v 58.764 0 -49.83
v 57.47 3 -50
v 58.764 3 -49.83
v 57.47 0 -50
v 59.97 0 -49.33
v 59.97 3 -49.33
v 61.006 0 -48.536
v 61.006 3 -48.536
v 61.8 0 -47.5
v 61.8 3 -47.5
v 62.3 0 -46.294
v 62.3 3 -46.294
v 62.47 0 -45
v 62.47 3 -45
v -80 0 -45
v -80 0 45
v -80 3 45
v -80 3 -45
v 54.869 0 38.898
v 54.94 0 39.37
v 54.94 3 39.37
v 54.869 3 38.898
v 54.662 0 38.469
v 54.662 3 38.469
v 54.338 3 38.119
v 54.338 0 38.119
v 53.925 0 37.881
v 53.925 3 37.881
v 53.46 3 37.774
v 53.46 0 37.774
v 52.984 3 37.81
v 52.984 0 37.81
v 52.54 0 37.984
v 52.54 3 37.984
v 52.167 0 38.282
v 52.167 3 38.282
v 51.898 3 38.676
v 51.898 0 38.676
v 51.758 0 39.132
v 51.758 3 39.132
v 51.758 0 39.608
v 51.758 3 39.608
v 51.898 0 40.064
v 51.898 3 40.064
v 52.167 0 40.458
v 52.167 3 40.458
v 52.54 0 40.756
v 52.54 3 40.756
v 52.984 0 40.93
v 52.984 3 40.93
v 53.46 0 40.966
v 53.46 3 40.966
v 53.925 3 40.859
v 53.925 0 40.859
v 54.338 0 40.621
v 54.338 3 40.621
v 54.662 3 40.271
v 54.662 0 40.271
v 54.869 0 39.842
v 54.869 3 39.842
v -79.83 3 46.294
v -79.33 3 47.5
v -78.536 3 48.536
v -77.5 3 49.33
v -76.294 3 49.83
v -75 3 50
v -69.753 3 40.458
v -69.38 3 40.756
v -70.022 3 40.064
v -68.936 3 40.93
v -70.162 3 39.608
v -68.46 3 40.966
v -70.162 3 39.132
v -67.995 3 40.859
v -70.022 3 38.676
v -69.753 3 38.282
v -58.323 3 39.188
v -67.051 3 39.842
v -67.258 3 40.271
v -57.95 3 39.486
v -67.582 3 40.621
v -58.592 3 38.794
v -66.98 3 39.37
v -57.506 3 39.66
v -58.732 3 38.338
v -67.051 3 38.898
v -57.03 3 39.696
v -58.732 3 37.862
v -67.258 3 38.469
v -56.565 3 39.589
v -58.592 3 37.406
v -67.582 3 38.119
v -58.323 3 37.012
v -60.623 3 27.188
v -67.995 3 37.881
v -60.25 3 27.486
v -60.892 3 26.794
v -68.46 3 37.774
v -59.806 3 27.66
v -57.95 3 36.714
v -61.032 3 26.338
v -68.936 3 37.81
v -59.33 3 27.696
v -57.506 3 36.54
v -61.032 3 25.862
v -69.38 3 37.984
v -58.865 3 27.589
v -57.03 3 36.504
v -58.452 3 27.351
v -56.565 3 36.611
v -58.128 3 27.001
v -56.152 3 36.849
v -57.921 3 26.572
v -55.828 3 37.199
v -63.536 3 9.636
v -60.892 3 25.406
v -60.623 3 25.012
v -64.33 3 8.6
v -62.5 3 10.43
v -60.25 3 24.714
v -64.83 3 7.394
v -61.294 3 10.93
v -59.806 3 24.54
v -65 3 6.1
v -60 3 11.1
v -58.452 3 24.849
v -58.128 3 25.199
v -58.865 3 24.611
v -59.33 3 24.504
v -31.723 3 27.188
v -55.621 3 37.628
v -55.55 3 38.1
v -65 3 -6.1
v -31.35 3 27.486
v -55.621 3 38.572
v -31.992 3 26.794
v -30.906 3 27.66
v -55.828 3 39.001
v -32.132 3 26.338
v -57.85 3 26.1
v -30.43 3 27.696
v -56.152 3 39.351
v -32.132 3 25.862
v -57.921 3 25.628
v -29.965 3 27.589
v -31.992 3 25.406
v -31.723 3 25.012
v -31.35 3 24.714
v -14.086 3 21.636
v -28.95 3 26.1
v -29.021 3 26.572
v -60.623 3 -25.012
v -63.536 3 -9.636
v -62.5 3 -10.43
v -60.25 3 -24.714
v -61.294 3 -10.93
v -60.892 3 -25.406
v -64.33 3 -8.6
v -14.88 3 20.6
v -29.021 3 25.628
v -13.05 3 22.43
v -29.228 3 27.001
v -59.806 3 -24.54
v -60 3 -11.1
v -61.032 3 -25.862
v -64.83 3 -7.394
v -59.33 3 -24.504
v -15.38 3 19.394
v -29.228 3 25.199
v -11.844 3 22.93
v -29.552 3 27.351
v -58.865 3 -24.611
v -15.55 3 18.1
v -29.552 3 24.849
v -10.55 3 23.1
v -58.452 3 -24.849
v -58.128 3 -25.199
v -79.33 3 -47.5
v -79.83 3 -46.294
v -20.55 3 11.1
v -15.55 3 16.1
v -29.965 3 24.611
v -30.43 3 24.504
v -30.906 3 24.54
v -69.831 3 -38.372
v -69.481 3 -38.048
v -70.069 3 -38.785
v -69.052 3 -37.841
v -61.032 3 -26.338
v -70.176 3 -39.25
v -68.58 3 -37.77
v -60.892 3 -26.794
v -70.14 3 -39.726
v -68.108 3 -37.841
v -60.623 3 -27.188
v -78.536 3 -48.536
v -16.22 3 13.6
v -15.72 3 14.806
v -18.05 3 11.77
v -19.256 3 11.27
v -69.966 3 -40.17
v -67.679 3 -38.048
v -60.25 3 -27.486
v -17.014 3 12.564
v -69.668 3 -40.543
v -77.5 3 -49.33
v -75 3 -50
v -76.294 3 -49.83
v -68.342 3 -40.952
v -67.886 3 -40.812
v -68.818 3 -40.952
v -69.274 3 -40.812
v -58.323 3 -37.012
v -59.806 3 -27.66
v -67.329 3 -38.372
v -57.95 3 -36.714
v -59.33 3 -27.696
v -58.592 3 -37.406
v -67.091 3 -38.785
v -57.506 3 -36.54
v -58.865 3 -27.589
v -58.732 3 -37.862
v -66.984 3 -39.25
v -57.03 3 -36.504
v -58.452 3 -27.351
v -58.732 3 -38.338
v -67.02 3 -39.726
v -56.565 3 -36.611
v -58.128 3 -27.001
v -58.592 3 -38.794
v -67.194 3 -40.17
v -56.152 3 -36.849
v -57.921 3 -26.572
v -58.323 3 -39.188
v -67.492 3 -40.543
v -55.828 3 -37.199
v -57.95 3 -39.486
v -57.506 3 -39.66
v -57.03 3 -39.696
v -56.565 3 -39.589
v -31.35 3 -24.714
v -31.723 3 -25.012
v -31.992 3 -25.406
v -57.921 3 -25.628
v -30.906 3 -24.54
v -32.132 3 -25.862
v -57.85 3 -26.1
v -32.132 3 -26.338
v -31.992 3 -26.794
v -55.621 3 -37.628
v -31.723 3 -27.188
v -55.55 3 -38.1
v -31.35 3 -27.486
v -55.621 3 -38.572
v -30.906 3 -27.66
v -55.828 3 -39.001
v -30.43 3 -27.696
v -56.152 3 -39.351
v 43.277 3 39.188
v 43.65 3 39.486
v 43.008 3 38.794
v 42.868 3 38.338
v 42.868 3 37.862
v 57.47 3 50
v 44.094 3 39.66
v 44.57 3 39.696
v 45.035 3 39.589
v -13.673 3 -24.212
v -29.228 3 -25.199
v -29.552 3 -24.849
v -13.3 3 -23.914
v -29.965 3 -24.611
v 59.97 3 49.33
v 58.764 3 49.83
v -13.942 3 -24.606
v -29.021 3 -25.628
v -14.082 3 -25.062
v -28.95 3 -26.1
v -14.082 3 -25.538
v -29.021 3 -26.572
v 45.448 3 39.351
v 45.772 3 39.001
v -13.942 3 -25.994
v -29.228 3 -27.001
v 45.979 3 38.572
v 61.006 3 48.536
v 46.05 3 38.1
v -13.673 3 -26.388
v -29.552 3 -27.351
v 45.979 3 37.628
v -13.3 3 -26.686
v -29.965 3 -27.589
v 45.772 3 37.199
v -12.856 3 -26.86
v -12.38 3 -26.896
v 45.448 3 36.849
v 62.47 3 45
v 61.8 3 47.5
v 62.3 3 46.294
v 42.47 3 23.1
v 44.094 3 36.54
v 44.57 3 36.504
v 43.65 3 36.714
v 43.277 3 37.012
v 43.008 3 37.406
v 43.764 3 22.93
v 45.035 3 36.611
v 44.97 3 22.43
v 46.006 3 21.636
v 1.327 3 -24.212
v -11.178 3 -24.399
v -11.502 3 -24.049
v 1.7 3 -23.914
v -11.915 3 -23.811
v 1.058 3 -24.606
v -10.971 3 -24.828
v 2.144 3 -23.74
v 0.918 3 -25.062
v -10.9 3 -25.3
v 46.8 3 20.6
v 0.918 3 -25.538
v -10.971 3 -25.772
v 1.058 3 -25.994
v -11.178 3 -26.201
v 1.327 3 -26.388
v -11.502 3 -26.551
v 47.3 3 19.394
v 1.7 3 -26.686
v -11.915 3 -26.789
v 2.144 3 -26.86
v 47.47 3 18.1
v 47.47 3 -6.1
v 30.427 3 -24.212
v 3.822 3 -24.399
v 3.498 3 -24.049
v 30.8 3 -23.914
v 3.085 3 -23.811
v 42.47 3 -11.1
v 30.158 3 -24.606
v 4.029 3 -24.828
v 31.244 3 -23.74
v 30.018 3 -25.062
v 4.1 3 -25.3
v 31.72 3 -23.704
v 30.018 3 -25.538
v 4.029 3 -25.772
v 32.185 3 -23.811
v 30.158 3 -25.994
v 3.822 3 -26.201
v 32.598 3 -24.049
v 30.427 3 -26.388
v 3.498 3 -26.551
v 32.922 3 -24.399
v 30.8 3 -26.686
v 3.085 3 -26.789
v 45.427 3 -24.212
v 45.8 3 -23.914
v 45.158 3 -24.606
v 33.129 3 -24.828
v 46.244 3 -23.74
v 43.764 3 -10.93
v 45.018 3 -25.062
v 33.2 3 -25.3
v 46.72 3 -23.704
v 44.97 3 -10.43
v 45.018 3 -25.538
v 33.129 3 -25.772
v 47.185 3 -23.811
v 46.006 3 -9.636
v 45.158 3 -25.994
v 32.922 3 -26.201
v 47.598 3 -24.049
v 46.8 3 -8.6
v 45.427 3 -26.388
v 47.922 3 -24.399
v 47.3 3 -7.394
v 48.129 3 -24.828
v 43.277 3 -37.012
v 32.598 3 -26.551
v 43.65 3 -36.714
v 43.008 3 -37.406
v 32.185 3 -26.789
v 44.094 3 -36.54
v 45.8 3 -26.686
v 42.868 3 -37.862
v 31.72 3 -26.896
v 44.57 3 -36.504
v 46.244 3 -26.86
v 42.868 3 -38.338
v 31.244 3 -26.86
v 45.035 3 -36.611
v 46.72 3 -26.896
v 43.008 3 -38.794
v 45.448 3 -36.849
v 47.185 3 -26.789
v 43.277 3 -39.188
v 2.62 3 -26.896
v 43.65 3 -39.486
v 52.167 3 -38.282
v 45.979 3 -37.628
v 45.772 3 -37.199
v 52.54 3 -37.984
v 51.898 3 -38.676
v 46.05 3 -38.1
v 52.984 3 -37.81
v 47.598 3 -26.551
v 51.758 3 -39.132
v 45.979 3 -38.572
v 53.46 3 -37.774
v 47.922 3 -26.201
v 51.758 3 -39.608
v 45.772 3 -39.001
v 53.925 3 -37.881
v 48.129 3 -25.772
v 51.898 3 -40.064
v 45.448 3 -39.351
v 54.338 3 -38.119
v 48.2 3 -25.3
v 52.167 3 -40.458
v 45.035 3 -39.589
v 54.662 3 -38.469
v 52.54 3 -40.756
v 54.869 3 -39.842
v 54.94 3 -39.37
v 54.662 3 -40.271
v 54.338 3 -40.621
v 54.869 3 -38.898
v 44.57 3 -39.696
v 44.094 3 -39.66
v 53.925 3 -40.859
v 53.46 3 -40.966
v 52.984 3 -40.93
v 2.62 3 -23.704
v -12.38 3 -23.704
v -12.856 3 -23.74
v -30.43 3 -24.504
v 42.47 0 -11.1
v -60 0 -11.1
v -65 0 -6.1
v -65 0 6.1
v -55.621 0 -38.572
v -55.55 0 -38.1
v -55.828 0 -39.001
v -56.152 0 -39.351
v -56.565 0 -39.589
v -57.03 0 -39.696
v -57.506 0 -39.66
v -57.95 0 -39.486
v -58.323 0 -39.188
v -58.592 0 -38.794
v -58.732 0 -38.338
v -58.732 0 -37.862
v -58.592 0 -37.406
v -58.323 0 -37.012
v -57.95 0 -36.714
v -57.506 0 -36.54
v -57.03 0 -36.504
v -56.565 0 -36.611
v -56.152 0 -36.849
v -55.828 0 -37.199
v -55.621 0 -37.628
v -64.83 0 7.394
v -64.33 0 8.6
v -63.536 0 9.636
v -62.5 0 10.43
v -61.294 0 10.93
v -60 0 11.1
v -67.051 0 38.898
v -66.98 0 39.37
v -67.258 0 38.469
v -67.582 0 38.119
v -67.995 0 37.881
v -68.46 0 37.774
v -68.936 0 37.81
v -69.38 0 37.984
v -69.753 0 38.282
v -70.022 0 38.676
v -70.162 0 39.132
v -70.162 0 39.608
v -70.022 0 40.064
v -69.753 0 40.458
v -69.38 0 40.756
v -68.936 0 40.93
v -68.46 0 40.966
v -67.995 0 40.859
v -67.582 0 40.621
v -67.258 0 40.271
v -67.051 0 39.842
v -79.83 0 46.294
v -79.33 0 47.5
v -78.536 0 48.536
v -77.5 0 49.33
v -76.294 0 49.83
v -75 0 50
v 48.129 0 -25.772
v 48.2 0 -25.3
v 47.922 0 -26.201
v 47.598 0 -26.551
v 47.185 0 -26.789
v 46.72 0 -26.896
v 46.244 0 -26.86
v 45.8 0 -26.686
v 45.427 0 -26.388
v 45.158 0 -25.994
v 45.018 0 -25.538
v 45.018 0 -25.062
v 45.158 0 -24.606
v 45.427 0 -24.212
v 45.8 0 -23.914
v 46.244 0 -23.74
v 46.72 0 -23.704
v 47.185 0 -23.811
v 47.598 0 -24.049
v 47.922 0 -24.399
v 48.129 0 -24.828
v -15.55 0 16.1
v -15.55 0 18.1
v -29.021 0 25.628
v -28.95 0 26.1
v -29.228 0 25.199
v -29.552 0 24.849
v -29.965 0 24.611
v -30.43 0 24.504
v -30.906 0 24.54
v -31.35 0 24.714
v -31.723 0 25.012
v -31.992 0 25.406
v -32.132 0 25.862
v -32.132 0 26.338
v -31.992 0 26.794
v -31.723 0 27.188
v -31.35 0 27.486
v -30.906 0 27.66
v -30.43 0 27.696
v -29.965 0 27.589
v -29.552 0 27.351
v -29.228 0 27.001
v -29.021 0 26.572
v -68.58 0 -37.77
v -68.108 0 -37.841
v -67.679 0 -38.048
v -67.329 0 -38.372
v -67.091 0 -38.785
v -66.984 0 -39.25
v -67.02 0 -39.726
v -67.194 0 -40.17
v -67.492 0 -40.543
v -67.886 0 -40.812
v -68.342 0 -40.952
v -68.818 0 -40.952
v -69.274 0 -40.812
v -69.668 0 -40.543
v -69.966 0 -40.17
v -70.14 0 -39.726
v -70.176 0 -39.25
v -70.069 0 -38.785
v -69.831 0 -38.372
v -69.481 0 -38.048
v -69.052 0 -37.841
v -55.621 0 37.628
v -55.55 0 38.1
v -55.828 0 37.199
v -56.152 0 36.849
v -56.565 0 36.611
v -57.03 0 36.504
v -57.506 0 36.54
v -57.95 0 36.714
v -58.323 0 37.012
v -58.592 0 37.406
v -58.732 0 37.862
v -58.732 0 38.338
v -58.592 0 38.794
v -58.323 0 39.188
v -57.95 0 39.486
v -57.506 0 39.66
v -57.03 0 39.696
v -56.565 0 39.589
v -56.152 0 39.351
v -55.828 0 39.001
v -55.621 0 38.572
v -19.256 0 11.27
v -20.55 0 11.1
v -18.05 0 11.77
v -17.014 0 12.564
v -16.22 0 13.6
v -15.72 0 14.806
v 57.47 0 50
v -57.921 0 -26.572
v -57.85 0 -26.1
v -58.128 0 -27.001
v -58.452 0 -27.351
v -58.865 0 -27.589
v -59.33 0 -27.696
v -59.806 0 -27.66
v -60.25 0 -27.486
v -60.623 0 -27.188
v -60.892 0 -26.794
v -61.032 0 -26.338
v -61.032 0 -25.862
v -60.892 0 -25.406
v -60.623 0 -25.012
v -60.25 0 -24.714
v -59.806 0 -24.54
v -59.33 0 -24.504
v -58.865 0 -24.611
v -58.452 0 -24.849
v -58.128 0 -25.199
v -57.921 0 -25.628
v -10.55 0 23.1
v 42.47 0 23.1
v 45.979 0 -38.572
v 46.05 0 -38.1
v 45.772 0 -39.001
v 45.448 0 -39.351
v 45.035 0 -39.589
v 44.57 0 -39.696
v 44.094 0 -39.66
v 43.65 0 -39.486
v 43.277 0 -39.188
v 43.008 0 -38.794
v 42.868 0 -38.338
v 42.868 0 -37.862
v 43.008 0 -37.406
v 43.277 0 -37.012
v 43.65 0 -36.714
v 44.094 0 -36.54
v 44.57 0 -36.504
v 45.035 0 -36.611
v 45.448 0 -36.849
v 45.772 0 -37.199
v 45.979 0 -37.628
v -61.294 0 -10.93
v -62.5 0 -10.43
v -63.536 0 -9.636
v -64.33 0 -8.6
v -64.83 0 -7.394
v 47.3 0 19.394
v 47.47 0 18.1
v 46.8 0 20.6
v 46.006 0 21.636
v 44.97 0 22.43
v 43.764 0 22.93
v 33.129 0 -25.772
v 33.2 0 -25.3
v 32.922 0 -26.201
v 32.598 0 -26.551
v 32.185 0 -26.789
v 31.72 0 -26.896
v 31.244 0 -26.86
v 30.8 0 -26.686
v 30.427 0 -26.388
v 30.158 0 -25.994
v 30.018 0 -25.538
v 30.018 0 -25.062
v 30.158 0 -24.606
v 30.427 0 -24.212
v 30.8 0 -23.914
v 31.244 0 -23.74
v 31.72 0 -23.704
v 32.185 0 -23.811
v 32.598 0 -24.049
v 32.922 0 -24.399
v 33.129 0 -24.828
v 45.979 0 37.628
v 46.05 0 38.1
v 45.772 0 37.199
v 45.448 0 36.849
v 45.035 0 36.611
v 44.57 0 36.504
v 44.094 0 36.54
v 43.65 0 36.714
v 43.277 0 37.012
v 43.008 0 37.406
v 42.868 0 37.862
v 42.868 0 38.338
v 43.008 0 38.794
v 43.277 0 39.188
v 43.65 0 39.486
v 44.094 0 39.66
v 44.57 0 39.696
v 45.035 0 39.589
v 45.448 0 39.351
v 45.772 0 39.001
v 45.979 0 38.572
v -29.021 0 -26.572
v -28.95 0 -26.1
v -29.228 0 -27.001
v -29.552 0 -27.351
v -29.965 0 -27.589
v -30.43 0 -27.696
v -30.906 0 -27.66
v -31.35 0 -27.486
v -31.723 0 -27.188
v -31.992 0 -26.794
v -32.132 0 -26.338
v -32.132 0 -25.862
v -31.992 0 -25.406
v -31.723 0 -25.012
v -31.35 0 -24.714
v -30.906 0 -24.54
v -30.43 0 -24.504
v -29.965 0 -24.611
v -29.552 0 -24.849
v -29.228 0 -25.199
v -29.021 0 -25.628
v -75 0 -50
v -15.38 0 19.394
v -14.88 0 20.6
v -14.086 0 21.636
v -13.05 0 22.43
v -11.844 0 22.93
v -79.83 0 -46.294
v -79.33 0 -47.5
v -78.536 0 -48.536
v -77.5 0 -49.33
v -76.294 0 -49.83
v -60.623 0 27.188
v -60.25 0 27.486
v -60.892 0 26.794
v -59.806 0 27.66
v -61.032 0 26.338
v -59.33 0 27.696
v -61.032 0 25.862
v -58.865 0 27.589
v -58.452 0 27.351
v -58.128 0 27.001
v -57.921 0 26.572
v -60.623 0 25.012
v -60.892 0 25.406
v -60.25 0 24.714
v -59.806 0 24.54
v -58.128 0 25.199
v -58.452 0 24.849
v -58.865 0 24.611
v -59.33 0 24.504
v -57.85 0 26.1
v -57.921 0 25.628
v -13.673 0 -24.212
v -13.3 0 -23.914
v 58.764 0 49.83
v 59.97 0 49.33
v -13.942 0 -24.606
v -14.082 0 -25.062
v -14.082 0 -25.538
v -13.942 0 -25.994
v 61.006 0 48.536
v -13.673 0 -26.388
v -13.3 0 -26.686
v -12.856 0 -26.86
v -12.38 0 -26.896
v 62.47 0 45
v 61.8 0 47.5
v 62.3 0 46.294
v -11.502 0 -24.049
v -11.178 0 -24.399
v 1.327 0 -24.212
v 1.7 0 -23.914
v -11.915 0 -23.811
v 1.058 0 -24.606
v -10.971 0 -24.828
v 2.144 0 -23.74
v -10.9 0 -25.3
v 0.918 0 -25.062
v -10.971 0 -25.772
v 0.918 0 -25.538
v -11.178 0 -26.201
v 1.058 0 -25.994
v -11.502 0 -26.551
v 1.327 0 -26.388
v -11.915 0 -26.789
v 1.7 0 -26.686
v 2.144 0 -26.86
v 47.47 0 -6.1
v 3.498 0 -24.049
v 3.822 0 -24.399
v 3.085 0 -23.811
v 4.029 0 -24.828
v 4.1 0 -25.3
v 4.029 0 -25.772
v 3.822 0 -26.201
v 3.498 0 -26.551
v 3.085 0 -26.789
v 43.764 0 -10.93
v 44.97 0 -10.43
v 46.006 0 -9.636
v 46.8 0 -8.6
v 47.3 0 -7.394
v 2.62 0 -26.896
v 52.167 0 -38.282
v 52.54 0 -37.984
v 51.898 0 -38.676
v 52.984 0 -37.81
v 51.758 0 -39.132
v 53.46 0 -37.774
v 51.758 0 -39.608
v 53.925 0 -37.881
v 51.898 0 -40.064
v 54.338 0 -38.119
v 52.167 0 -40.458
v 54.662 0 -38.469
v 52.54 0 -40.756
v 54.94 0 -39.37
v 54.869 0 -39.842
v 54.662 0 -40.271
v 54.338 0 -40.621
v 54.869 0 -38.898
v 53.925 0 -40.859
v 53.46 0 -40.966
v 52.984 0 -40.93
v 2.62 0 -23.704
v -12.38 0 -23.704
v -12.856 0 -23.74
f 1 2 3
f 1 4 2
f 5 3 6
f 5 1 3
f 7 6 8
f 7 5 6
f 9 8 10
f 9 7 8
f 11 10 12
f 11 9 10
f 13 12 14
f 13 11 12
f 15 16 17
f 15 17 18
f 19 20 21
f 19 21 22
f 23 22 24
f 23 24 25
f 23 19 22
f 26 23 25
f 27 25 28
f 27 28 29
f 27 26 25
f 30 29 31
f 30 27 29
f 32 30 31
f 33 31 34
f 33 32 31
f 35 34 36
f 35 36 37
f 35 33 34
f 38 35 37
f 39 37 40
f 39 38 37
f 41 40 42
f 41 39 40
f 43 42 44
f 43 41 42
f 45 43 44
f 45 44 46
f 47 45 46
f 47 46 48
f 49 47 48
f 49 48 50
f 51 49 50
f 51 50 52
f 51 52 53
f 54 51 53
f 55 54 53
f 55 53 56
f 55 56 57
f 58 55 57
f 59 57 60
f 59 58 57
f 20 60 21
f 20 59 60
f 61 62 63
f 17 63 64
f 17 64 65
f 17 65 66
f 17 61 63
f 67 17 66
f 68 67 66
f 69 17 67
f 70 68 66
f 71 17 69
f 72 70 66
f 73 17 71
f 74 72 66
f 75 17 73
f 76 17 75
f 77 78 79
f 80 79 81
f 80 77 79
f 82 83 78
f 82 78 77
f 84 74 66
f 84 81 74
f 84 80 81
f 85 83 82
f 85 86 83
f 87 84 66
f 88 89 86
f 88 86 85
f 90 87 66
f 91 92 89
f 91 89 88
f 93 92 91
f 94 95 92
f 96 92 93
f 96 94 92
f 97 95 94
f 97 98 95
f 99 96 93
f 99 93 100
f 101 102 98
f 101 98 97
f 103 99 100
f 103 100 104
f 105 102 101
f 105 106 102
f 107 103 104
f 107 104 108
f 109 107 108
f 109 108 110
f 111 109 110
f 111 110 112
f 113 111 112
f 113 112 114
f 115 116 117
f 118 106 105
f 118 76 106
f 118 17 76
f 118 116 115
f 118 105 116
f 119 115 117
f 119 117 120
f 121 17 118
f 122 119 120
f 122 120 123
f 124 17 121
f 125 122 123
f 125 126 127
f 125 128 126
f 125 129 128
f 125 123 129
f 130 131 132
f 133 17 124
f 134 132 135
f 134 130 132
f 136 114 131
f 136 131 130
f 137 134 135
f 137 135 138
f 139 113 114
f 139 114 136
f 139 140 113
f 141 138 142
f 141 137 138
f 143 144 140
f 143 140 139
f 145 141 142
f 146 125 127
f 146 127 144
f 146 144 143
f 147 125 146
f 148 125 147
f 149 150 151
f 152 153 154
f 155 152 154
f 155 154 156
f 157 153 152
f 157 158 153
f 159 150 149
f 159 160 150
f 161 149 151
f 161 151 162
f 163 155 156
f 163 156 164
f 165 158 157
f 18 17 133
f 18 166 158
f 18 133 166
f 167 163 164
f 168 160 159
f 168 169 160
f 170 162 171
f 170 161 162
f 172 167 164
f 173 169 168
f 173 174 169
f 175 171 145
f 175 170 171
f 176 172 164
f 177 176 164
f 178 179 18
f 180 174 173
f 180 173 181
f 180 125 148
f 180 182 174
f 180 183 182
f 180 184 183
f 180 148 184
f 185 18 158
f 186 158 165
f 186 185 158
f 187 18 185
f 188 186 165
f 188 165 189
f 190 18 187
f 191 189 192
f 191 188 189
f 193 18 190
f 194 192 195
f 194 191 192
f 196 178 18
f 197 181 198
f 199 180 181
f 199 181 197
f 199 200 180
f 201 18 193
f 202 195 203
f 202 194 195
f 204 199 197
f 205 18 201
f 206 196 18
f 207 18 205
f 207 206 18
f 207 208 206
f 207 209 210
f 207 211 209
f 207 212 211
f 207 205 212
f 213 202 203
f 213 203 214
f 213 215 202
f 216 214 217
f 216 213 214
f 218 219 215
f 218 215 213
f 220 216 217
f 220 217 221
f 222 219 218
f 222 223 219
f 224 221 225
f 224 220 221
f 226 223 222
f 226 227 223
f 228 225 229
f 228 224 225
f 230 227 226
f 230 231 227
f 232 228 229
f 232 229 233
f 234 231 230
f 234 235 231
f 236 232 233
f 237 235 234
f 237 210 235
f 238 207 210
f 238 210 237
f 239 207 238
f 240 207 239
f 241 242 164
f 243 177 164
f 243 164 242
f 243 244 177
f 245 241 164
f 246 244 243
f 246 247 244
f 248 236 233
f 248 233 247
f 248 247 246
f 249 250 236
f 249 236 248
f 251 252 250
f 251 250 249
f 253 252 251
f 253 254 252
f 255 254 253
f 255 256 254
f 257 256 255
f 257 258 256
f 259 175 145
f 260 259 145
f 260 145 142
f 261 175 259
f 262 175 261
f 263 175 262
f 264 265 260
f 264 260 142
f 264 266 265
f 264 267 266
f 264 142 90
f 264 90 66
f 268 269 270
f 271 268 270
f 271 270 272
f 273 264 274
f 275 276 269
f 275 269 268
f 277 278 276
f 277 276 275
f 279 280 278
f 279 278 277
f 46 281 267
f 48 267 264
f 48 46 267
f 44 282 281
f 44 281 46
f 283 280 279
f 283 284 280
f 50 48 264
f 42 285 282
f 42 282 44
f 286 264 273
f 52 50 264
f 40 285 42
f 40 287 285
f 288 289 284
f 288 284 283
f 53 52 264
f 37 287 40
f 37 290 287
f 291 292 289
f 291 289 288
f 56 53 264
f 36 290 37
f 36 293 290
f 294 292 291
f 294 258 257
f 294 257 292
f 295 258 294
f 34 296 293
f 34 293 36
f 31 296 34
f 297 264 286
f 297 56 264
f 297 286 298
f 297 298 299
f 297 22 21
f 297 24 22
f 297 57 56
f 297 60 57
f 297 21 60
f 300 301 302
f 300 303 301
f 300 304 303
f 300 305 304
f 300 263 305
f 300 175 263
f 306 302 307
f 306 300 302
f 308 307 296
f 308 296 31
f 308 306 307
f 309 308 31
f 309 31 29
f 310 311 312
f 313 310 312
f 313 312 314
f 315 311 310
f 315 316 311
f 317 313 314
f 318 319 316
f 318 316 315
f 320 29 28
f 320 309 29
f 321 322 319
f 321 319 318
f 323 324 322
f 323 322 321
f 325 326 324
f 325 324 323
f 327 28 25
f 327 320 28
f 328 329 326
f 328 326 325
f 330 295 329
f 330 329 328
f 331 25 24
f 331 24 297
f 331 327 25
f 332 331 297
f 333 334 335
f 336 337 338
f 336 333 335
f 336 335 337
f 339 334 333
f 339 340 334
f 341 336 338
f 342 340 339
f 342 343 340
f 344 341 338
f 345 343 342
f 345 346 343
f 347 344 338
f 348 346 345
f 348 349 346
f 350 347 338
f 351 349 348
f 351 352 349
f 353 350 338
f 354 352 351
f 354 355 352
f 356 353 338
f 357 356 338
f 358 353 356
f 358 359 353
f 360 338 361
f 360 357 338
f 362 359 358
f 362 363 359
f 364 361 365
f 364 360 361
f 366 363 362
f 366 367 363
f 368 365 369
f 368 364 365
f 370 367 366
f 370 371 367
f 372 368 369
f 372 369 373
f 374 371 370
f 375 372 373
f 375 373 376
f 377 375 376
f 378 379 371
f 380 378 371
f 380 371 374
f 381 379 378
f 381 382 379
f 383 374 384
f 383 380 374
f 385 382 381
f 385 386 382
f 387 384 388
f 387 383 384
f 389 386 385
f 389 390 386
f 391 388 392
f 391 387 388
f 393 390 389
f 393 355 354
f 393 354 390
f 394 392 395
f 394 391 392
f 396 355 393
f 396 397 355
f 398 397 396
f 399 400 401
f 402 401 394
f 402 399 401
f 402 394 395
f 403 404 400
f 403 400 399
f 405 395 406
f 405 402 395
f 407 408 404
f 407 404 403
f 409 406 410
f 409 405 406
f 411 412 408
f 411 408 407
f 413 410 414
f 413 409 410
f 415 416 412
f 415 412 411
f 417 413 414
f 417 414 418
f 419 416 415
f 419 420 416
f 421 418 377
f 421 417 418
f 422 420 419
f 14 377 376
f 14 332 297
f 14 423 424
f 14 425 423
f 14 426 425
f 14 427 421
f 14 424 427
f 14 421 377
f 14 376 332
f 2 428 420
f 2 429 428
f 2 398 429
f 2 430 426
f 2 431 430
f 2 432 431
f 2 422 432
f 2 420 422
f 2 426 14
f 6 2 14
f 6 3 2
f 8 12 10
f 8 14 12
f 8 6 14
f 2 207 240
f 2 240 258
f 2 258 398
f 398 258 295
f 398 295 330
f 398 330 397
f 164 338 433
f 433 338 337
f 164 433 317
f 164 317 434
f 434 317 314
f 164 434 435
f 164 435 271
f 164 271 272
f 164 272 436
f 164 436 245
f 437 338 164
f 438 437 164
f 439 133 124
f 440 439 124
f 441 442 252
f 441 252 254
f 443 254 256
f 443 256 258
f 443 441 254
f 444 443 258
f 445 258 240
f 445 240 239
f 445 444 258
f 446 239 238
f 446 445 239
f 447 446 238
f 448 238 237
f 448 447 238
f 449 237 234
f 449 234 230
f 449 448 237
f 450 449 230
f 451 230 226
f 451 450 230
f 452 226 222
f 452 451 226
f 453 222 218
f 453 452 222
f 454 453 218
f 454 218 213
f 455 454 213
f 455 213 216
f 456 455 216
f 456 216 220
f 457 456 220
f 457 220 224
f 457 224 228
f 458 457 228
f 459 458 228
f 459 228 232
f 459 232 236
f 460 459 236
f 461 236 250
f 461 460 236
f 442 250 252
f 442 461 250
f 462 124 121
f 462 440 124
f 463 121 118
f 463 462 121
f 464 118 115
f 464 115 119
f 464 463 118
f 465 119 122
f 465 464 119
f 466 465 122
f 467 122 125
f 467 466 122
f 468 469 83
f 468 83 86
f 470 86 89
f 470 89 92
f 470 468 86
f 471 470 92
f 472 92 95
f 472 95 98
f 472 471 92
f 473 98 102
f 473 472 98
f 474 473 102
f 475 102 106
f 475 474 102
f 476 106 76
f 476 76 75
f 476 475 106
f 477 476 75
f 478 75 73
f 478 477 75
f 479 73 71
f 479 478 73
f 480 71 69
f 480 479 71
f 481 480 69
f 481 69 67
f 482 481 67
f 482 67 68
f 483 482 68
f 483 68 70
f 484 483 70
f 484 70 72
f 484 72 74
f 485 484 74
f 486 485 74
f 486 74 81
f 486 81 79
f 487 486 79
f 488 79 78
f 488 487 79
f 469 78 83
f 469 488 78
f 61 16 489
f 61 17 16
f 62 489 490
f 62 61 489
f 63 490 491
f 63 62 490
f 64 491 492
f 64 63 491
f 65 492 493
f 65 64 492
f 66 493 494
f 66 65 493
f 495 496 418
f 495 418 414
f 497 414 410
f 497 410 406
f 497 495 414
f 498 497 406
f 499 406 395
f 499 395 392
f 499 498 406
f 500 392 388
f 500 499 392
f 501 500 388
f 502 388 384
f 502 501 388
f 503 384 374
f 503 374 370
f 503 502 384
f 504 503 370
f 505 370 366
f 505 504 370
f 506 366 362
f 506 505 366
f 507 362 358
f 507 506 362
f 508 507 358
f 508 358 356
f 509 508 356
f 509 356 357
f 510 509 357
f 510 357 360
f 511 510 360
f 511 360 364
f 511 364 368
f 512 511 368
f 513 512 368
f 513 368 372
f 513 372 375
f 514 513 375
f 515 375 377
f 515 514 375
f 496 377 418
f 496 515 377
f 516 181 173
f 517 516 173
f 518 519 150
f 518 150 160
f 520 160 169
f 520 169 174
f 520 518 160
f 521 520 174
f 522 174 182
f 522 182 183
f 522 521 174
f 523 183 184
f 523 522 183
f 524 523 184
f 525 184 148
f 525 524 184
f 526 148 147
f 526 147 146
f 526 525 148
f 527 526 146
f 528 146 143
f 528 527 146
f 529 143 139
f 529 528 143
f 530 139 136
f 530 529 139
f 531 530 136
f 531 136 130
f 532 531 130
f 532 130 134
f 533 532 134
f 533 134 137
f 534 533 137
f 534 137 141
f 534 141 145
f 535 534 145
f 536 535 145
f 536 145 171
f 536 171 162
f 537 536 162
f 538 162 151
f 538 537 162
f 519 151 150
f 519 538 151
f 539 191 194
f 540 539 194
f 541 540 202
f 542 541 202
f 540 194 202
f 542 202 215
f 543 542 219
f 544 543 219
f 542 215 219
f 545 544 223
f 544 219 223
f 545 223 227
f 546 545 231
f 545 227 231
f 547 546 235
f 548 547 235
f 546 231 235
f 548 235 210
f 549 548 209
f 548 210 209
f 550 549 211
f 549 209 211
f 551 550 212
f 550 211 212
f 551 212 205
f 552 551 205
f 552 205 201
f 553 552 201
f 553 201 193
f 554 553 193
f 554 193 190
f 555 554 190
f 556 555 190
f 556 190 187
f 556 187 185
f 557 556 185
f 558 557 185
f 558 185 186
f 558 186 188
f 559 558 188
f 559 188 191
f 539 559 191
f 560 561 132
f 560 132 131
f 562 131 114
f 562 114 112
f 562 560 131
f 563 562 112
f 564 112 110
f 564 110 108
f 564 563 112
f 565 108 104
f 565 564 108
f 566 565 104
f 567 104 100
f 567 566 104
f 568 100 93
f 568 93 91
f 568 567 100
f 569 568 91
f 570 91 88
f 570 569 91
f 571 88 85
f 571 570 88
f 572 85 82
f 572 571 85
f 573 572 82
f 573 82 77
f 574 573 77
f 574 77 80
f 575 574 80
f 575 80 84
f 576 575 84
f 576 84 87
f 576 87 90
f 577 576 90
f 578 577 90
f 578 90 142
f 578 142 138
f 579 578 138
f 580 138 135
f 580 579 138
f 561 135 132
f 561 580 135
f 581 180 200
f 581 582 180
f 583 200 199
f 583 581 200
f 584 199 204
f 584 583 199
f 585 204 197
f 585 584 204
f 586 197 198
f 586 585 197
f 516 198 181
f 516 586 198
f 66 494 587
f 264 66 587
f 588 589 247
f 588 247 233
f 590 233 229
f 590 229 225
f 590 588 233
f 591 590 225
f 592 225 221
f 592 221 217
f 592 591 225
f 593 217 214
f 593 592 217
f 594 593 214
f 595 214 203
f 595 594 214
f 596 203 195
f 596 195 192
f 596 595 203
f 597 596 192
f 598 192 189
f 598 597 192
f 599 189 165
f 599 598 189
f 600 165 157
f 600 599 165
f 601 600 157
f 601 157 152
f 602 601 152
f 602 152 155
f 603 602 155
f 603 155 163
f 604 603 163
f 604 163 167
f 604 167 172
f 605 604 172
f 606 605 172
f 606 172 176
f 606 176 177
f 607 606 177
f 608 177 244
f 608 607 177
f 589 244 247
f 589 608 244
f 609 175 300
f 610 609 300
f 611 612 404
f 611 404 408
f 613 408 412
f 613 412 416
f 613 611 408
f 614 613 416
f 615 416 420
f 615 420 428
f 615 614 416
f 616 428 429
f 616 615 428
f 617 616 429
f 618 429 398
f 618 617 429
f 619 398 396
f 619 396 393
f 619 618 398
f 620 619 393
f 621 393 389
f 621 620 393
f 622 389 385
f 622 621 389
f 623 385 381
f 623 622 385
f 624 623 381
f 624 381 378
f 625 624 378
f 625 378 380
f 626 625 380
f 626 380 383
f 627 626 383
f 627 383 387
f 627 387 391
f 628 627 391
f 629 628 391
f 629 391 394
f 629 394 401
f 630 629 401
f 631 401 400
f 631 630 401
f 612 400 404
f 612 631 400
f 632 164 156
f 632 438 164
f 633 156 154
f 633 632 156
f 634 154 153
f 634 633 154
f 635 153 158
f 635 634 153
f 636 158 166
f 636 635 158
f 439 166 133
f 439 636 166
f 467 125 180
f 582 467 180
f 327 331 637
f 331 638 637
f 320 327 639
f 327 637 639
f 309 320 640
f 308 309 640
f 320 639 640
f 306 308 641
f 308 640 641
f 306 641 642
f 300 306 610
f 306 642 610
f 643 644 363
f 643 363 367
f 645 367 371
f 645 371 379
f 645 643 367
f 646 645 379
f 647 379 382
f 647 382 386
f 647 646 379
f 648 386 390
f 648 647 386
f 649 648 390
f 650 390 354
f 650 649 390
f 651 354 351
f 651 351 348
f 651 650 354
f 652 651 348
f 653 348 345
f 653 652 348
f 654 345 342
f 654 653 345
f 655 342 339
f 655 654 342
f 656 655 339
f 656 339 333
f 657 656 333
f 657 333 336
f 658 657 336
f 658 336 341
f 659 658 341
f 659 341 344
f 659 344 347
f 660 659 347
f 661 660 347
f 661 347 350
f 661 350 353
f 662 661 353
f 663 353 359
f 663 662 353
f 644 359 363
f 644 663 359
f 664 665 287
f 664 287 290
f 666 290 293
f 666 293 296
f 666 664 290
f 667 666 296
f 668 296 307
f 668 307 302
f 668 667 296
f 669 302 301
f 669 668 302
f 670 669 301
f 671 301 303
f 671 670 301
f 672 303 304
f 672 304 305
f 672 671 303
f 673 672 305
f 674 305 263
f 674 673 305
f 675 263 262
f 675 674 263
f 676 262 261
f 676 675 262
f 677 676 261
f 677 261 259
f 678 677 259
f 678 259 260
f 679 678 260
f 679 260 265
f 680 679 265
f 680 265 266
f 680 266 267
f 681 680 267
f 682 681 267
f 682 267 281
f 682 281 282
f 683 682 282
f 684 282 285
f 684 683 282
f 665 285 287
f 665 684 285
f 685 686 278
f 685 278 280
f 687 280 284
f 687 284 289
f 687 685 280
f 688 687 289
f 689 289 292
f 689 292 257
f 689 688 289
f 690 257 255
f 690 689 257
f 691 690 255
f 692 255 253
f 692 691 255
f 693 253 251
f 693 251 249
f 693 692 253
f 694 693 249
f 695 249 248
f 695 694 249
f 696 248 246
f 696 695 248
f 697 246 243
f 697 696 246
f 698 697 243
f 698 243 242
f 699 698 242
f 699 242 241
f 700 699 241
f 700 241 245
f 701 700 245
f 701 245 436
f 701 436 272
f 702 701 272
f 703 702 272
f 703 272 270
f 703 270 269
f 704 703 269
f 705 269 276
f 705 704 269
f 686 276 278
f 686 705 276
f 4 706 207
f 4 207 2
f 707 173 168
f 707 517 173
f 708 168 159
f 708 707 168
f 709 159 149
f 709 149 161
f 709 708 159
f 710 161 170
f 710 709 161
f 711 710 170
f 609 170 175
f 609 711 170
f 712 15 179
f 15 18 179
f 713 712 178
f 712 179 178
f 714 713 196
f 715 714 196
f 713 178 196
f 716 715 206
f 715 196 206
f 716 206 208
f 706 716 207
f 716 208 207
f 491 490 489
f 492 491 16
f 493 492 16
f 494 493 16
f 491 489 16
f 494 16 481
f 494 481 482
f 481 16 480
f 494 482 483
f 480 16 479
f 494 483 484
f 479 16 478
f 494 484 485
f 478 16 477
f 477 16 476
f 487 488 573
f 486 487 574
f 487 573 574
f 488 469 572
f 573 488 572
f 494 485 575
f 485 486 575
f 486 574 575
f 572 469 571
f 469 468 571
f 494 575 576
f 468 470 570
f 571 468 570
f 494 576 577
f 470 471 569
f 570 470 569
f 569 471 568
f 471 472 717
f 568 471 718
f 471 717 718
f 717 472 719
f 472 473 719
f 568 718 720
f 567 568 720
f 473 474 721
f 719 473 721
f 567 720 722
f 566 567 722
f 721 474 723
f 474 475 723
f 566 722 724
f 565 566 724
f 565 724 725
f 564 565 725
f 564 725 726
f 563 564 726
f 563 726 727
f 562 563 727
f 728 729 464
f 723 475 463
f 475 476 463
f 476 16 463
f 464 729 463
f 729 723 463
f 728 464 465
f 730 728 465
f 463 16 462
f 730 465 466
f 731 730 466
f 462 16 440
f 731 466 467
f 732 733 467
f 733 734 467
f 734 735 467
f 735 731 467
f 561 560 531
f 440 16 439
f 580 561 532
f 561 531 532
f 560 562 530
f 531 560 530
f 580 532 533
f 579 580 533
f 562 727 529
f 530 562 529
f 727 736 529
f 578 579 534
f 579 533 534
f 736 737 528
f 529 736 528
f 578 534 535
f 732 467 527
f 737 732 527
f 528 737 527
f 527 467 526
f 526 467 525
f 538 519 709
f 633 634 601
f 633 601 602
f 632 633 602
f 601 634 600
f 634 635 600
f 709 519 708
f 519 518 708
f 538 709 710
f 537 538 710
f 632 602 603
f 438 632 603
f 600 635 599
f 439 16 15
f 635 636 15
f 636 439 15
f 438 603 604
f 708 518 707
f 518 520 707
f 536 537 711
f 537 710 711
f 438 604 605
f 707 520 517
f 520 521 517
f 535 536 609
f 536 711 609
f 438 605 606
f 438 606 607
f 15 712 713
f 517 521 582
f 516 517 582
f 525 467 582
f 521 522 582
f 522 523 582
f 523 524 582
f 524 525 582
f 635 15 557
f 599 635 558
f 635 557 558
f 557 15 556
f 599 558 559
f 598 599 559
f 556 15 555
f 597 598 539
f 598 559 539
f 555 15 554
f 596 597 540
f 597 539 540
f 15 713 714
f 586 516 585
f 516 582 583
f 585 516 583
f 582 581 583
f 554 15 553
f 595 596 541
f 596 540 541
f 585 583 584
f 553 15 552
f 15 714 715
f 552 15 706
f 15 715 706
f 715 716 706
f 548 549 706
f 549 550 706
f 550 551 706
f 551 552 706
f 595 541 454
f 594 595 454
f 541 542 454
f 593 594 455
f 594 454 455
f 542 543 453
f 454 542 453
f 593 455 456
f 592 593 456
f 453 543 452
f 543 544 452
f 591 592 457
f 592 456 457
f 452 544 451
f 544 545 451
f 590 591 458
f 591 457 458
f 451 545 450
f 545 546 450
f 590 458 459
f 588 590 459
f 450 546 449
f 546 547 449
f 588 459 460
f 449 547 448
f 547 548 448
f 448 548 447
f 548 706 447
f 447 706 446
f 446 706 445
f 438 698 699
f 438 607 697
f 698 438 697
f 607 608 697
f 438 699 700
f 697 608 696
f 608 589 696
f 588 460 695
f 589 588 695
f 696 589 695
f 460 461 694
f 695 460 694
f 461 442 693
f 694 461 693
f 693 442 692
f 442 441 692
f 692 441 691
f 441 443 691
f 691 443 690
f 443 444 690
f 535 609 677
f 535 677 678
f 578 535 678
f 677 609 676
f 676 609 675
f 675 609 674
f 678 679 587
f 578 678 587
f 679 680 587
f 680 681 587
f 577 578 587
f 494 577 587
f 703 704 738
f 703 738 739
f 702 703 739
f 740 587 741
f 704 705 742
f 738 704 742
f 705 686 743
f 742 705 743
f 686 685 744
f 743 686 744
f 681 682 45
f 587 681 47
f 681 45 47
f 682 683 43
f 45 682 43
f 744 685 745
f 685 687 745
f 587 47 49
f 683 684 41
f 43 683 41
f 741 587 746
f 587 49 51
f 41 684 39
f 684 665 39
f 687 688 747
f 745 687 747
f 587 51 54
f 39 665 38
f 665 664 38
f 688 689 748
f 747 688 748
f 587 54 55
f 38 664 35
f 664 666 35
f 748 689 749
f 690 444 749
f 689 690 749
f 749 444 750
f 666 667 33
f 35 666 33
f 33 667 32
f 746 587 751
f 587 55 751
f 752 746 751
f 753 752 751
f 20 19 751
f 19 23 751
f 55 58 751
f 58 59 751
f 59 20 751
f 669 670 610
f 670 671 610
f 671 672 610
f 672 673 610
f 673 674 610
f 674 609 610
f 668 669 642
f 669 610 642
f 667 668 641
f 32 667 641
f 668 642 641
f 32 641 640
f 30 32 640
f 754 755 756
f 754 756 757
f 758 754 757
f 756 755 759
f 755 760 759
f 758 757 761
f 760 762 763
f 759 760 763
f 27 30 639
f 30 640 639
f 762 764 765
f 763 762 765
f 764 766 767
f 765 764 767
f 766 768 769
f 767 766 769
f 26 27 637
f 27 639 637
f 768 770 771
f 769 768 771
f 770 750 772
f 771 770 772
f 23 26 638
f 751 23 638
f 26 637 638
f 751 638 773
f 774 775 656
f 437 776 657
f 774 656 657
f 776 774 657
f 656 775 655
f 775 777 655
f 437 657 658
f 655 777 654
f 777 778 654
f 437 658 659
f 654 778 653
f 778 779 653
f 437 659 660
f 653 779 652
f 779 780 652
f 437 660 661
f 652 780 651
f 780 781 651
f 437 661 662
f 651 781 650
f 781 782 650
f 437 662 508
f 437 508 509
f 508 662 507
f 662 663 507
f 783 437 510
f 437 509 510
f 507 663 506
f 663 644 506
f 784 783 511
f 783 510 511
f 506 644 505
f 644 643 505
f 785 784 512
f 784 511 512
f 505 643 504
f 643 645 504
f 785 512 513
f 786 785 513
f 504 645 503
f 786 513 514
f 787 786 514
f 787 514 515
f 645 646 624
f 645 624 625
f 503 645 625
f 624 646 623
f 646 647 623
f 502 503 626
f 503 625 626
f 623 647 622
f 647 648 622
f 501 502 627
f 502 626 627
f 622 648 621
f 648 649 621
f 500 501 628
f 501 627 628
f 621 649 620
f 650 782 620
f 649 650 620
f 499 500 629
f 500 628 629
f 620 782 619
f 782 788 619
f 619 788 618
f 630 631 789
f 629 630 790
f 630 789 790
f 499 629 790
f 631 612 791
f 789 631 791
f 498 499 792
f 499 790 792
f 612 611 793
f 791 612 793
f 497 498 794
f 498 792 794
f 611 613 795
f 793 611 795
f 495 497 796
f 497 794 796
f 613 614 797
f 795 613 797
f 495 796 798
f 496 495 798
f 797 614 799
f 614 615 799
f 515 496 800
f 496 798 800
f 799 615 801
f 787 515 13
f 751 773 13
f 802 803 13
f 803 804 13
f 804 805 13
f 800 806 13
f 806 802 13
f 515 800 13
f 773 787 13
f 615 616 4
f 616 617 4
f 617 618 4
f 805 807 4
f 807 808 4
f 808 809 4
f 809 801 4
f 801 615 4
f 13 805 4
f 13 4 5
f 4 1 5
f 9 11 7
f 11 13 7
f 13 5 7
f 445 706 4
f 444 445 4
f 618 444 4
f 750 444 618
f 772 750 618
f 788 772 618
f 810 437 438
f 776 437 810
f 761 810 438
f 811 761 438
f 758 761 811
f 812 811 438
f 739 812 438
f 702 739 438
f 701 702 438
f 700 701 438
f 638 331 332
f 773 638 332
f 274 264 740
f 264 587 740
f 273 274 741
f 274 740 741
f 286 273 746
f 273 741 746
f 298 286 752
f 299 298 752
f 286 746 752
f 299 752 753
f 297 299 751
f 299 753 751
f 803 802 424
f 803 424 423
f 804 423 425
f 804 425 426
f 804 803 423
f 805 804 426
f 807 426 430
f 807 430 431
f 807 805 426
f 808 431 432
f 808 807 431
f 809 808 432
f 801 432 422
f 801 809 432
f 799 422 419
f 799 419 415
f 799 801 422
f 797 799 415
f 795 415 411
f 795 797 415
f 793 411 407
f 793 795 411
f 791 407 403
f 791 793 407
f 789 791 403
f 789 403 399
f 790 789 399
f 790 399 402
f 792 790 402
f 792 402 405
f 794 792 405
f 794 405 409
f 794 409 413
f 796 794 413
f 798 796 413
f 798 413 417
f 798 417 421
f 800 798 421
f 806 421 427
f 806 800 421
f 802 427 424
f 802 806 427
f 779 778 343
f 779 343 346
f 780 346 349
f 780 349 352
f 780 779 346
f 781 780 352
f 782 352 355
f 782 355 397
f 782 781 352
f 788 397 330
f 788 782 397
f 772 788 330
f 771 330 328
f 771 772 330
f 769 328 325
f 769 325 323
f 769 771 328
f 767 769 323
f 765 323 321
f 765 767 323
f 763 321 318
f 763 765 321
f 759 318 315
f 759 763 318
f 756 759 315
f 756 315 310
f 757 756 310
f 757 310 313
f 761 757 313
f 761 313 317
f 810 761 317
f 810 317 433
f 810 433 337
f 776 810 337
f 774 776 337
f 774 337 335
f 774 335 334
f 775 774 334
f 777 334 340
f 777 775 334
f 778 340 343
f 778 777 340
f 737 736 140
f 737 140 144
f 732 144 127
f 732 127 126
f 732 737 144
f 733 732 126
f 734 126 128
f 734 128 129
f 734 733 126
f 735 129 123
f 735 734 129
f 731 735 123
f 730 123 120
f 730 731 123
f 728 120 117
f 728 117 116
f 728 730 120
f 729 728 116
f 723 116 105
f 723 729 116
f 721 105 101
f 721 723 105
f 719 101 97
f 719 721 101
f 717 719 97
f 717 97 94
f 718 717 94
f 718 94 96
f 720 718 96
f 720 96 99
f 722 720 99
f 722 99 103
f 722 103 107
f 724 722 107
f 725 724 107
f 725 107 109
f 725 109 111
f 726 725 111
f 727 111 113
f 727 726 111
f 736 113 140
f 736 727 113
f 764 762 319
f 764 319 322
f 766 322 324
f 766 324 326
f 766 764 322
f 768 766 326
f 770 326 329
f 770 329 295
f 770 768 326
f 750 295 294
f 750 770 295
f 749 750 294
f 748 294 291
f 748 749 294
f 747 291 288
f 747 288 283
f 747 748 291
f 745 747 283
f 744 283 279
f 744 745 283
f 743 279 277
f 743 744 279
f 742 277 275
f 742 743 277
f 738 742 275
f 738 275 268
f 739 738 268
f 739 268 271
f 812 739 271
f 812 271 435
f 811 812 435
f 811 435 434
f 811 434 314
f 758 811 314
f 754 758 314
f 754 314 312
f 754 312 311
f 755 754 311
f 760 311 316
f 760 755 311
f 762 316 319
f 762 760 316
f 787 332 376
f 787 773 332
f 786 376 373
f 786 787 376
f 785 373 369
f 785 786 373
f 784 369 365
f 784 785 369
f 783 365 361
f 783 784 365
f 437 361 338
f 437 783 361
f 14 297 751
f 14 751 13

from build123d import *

# Parameters (mm, degrees)
SKETCH1_W                 = 160
SKETCH1_H                 = 100
BOSS_EXTRUDE1_DEPTH       = 3
SKETCH5_R                 = 1.6
CUT_EXTRUDE1_DEPTH        = 95.387499172
SKETCH_PATTERN1_OUTLINE_R = 1.6
SKETCH_PATTERN1_DEPTH     = 3
ZONA_GPIOS_W              = 17.53
ZONA_GPIOS_H              = 100
ZONAGPIOS_DEPTH           = 95.387499172
CUT_EXTRUDE4_DEPTH        = 95.387499172
FILLET1_R                 = 5


# Read off the part's stored shape, not the designer's step: Sketch-Pattern1
with BuildPart() as part:
    # Sketch1 → Boss-Extrude1 (new body)
    with BuildSketch(Plane(origin=(0, 0, 0), x_dir=(1, 0, 0), z_dir=(0, 1, 0))):
        Rectangle(SKETCH1_W, SKETCH1_H)
    extrude(amount=BOSS_EXTRUDE1_DEPTH)

    # Sketch5 → Cut-Extrude1 (cut, through all)
    with BuildSketch(Plane(origin=(0, 3, 0), x_dir=(1, 0, 0), z_dir=(0, 1, 0))):
        with Locations(Location((-68.58, 39.37, 0), (0, 0, 270))):
            Circle(SKETCH5_R)
    extrude(amount=-CUT_EXTRUDE1_DEPTH, mode=Mode.SUBTRACT)

    # Sketch-Pattern1 outline → Sketch-Pattern1 (cut)
    with BuildSketch(Plane(origin=(0, 0, 0), x_dir=(1, 0, 0), z_dir=(0, 1, 0))):
        with Locations((46.6, 25.3)):
            Circle(SKETCH_PATTERN1_OUTLINE_R)
        with Locations((-57.15, 38.1)):
            Circle(SKETCH_PATTERN1_OUTLINE_R)
        with Locations((-57.15, -38.1)):
            Circle(SKETCH_PATTERN1_OUTLINE_R)
        with Locations((44.45, -38.1)):
            Circle(SKETCH_PATTERN1_OUTLINE_R)
        with Locations((53.34, 39.37)):
            Circle(SKETCH_PATTERN1_OUTLINE_R)
        with Locations((53.34, -39.37)):
            Circle(SKETCH_PATTERN1_OUTLINE_R)
        with Locations((44.45, 38.1)):
            Circle(SKETCH_PATTERN1_OUTLINE_R)
        with Locations((-68.58, -39.37)):
            Circle(SKETCH_PATTERN1_OUTLINE_R)
        with Locations((-59.45, -26.1)):
            Circle(SKETCH_PATTERN1_OUTLINE_R)
        with Locations((-30.55, -26.1)):
            Circle(SKETCH_PATTERN1_OUTLINE_R)
        with Locations((-30.55, 26.1)):
            Circle(SKETCH_PATTERN1_OUTLINE_R)
        with Locations((-59.45, 26.1)):
            Circle(SKETCH_PATTERN1_OUTLINE_R)
        with Locations((-12.5, 25.3)):
            Circle(SKETCH_PATTERN1_OUTLINE_R)
        with Locations((2.5, 25.3)):
            Circle(SKETCH_PATTERN1_OUTLINE_R)
        with Locations((31.6, 25.3)):
            Circle(SKETCH_PATTERN1_OUTLINE_R)
    extrude(amount=SKETCH_PATTERN1_DEPTH, mode=Mode.SUBTRACT)

    # zona gpios → ZonaGPIOS (cut, through all)
    with BuildSketch(Plane(origin=(0, 3, 0), x_dir=(1, 0, 0), z_dir=(0, 1, 0))):
        with Locations((71.235, 0)):
            Rectangle(ZONA_GPIOS_W, ZONA_GPIOS_H)
    extrude(amount=-ZONAGPIOS_DEPTH, mode=Mode.SUBTRACT)

    # Sketch11 → Cut-Extrude4 (cut, through all)
    with BuildSketch(Plane(origin=(0, 3, 0), x_dir=(1, 0, 0), z_dir=(0, 1, 0))):
        Polygon((47.47, -23.1), (47.47, 11.1), (-65, 11.1), (-65, -11.1), (-15.55, -11.1), (-15.55, -23.1), align=None)
    extrude(amount=-CUT_EXTRUDE4_DEPTH, mode=Mode.SUBTRACT)

    # Fillet1
    fillet1_edges = [part.edges().sort_by_distance(p)[0] for p in [
        (47.47, 1.5, 23.1),
        (-15.55, 1.5, 23.1),
        (-15.55, 1.5, 11.1),
        (-65, 1.5, 11.1),
        (-65, 1.5, -11.1),
        (47.47, 1.5, -11.1),
        (-80, 1.5, 50),
        (-80, 1.5, -50),
        (62.47, 1.5, 50),
        (62.47, 1.5, -50),
    ]]
    fillet(fillet1_edges, radius=FILLET1_R)


solid = part.part
